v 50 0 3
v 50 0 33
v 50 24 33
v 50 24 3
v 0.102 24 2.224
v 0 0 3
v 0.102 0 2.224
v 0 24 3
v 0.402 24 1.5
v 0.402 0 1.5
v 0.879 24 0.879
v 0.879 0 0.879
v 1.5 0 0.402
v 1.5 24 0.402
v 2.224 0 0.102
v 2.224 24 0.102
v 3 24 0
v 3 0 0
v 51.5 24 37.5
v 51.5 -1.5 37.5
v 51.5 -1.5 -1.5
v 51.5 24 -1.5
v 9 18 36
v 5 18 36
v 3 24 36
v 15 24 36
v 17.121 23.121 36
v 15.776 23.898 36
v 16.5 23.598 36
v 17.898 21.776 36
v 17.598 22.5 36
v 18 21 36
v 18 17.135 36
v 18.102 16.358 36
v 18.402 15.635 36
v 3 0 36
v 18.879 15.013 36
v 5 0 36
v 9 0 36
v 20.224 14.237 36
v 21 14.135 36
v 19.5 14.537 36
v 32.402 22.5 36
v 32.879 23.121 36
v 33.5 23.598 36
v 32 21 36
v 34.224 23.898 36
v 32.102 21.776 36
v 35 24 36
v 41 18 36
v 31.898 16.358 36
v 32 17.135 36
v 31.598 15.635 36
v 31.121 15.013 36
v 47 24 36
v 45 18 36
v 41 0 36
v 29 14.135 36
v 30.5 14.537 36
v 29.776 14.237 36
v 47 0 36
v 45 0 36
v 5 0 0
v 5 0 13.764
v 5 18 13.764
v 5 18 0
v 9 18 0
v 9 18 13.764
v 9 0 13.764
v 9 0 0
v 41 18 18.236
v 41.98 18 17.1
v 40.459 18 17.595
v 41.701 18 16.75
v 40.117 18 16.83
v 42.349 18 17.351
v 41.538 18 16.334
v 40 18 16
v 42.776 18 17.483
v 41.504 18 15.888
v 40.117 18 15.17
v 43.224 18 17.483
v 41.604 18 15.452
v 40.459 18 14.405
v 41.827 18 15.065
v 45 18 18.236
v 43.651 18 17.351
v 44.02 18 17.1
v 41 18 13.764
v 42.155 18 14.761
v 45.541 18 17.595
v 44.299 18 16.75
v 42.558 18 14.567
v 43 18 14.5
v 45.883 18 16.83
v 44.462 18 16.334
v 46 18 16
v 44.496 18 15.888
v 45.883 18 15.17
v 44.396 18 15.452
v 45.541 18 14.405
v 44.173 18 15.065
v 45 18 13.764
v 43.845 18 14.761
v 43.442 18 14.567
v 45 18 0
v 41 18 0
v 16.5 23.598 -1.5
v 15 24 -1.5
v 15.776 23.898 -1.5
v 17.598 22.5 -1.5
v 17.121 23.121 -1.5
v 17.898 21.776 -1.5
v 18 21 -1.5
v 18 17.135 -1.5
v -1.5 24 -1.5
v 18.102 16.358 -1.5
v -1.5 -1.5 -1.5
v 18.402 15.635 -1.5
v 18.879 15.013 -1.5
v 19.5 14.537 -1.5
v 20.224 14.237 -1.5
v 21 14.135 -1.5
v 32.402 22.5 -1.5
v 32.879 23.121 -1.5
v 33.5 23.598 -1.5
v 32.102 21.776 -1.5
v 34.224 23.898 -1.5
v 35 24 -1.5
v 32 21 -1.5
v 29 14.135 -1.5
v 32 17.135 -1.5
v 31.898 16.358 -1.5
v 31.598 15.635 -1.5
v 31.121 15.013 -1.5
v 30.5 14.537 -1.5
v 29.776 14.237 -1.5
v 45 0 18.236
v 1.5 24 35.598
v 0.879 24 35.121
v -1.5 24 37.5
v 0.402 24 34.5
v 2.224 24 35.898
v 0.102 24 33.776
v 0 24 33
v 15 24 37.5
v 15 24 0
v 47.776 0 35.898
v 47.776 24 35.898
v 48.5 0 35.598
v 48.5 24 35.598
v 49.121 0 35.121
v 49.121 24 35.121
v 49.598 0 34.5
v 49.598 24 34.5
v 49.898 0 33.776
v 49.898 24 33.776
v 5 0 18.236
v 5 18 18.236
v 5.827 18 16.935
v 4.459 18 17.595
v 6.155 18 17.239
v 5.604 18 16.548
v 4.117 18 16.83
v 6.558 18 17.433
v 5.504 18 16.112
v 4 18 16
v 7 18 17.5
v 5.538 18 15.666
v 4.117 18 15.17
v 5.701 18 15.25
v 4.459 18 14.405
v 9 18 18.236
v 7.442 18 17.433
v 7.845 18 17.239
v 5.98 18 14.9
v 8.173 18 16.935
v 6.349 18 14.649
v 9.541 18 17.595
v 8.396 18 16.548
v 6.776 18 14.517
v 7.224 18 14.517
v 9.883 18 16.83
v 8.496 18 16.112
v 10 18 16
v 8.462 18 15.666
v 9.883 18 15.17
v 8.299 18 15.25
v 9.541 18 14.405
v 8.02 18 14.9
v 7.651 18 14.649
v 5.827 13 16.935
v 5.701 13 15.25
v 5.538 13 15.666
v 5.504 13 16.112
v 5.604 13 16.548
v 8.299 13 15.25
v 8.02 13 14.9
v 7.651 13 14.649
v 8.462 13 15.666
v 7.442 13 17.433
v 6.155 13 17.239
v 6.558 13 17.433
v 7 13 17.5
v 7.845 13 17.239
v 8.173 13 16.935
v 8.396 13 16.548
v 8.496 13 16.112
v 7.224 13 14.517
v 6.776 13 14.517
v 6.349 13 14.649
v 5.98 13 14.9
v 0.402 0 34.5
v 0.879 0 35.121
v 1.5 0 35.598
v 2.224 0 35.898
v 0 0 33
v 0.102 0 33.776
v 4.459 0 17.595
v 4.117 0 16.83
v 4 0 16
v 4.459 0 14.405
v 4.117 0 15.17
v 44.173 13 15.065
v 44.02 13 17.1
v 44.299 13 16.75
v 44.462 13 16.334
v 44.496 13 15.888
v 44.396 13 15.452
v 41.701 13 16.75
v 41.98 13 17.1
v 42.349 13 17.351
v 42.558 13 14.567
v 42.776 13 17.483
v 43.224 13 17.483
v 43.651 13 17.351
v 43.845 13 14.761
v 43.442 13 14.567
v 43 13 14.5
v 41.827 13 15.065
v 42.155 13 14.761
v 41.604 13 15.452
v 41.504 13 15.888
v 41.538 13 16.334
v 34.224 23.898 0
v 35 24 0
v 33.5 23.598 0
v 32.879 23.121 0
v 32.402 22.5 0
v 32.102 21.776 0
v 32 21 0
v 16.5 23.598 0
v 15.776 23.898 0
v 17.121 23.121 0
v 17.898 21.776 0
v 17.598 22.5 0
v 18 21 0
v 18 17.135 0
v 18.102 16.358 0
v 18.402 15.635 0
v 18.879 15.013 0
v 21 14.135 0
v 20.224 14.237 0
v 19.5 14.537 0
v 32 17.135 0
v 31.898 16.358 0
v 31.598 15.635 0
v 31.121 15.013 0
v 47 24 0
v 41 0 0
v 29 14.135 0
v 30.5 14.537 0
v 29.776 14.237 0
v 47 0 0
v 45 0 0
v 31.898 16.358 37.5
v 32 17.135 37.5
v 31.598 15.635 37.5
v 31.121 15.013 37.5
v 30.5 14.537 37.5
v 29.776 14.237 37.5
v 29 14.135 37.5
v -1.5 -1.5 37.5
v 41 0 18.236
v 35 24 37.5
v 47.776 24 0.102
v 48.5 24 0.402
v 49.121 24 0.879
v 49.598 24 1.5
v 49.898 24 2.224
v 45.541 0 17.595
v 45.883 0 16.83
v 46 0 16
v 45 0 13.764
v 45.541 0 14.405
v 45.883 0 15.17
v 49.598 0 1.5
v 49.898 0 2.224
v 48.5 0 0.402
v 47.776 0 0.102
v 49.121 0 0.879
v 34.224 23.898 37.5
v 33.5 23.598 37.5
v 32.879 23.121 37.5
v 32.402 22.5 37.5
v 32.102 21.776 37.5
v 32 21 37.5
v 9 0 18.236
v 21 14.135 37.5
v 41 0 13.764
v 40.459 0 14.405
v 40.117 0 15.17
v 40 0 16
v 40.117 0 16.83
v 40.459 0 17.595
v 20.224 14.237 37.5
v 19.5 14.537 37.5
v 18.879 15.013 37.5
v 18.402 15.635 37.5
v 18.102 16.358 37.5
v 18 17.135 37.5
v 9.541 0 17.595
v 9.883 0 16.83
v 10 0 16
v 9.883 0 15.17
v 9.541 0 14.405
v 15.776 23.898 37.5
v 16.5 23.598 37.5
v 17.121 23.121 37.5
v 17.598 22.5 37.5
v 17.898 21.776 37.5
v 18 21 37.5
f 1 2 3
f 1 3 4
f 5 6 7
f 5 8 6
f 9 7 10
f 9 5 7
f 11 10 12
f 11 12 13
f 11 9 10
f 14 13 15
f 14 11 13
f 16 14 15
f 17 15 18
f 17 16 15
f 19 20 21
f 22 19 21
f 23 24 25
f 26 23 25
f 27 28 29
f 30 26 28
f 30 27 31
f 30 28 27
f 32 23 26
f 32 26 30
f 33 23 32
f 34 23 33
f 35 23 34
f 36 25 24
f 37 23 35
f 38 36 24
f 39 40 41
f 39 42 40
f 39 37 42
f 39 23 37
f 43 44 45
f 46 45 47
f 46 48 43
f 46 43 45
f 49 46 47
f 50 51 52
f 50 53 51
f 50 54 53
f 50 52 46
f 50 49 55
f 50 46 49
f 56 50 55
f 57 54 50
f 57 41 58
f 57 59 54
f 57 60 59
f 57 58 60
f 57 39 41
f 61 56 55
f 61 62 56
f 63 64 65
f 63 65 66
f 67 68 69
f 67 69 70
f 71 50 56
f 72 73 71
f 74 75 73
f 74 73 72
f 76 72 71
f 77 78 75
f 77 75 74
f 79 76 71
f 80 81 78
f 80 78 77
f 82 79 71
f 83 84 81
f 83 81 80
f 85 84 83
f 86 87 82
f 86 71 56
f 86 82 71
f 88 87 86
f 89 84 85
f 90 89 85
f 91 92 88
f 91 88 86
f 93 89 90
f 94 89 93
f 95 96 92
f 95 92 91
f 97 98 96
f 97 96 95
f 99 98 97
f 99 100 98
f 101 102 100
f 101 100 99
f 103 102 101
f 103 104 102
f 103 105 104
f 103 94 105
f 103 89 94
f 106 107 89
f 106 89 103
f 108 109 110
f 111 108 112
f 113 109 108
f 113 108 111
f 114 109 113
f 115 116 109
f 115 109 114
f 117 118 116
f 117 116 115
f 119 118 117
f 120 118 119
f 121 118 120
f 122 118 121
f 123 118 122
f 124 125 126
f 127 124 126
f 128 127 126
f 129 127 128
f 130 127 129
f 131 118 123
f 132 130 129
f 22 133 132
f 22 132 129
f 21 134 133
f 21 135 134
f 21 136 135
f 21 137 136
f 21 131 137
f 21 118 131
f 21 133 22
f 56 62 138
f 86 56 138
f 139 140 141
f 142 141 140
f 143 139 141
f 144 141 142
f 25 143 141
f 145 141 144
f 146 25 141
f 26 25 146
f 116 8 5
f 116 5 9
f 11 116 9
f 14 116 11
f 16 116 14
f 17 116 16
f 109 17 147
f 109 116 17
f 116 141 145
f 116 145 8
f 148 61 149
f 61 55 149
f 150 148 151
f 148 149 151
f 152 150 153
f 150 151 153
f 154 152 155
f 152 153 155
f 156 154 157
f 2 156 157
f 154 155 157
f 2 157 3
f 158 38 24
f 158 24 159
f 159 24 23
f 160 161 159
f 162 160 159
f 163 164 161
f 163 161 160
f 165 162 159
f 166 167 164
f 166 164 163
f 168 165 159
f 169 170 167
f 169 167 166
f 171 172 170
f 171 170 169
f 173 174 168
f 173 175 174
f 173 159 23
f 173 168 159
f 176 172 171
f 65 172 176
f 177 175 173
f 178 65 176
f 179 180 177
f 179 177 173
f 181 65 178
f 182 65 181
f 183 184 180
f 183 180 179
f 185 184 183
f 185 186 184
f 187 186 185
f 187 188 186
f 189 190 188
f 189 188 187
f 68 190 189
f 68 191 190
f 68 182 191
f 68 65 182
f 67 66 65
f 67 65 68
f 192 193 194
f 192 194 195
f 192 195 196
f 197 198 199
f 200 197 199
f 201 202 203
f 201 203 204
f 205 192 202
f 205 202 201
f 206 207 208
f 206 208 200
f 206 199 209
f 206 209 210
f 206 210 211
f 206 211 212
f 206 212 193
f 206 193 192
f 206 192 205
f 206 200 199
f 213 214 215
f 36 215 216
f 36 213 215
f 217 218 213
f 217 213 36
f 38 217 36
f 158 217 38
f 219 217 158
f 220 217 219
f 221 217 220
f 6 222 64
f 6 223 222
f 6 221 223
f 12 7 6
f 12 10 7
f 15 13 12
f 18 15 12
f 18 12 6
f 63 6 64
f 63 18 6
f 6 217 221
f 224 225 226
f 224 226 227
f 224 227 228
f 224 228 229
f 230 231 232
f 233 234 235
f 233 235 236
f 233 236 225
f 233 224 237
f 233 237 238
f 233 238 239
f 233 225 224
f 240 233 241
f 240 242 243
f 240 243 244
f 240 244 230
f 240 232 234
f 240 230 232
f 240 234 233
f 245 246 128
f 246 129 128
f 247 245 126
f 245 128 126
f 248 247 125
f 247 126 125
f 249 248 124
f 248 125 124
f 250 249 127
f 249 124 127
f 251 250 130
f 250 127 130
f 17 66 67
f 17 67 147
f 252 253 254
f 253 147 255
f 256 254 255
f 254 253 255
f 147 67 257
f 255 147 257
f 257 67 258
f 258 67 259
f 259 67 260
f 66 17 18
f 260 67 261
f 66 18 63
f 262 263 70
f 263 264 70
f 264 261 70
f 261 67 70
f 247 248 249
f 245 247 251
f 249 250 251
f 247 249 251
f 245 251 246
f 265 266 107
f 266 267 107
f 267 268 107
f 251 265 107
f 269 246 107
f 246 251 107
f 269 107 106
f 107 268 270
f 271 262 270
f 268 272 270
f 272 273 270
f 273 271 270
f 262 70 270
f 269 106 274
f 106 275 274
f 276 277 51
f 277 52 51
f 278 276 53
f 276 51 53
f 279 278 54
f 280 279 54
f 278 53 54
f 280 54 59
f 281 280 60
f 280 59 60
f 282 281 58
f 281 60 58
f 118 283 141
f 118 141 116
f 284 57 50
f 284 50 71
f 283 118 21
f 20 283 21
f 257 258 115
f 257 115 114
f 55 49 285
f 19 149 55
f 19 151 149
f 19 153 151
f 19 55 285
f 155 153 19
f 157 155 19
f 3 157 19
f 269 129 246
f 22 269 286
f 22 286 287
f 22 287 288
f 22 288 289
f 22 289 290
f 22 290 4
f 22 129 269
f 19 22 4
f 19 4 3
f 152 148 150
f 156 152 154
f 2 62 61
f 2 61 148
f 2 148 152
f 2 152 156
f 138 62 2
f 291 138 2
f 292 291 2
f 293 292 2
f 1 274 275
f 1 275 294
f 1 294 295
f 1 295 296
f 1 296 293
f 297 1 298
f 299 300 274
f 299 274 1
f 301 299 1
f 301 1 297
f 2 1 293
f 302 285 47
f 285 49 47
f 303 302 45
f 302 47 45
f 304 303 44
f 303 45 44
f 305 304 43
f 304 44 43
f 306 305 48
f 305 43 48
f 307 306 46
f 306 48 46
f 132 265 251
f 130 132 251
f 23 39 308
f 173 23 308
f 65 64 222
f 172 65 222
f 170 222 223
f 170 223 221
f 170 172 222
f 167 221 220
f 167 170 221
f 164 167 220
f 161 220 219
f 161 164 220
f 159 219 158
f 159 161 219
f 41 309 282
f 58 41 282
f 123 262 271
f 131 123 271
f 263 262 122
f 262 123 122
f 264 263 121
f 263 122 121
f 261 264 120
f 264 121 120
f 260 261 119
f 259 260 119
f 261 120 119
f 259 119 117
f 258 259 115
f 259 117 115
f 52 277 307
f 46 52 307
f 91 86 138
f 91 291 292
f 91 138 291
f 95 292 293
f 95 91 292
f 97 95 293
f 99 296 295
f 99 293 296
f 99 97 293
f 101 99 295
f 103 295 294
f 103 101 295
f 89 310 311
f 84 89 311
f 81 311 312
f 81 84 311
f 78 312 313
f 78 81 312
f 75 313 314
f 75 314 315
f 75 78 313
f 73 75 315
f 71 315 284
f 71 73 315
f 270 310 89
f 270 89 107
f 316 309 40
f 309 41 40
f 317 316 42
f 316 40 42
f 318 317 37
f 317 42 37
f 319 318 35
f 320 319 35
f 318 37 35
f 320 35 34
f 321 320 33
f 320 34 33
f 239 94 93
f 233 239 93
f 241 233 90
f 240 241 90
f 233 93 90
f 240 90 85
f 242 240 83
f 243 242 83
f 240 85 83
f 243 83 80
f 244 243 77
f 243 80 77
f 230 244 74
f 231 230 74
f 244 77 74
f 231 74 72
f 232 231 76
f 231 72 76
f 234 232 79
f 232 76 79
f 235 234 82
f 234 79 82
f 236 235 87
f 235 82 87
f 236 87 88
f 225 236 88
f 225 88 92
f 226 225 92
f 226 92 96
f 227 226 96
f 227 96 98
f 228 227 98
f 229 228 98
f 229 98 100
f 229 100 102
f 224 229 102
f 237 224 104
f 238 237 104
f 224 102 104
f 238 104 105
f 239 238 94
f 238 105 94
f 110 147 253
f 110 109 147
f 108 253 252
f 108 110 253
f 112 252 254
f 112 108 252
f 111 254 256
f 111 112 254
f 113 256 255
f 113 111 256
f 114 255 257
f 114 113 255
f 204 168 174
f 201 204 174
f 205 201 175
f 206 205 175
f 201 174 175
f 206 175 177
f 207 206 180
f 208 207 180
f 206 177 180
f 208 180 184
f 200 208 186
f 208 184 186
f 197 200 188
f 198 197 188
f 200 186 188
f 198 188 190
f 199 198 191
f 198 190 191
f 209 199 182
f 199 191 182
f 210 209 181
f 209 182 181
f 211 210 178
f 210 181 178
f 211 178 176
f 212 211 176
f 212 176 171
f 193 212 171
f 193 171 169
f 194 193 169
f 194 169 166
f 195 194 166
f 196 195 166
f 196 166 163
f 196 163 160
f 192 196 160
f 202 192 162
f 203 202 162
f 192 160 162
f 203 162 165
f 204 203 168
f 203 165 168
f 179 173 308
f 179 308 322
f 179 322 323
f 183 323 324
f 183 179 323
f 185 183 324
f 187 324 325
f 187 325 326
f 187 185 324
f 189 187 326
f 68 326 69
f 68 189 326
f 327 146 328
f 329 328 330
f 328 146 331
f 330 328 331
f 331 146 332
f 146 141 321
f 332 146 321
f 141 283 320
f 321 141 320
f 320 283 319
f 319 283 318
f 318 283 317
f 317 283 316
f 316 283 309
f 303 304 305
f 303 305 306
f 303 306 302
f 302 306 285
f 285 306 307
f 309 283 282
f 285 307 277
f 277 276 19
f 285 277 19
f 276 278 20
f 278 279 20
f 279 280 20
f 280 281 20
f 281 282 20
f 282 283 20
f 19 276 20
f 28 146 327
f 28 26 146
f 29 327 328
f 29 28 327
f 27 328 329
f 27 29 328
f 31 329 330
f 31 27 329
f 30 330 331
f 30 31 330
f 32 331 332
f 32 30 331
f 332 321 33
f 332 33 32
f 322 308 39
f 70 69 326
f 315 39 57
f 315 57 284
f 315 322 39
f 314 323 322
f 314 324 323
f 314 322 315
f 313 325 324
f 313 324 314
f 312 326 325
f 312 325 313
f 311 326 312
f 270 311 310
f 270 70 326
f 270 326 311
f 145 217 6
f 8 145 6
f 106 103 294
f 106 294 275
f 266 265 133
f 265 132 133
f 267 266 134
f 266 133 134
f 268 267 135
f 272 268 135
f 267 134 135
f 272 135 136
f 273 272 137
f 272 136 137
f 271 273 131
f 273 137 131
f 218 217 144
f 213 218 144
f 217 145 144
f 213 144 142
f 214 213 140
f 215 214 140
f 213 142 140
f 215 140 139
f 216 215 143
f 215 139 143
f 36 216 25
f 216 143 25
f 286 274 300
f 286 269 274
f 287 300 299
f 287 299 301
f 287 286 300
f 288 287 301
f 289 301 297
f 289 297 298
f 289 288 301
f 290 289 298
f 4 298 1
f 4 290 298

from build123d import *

# Parameters (mm, degrees)
SKETCH1_W           = 50
SKETCH1_H           = 36
BOSS_EXTRUDE1_DEPTH = 24
SHELL1_T            = 1.5
SKETCH2_W           = 4
SKETCH2_H           = 36
BOSS_EXTRUDE2_DEPTH = 18
SKETCH6_W           = 14
SKETCH6_H           = 14
CUT_EXTRUDE2_DEPTH  = 58
FILLET1_R           = 3
SKETCH4_R           = 3
BOSS_EXTRUDE3_DEPTH = 18
SKETCH7_R           = 1.5
CUT_EXTRUDE3_DEPTH  = 5


with BuildPart() as part:
    # Sketch1 → Boss-Extrude1 (new body)
    with BuildSketch(Plane(origin=(0, 0, 0), x_dir=(1, 0, 0), z_dir=(0, 1, 0))):
        with Locations((25, -18)):
            Rectangle(SKETCH1_W, SKETCH1_H)
    extrude(amount=BOSS_EXTRUDE1_DEPTH)

    # Shell1
    shell1_openings = [part.faces().sort_by_distance(p)[0] for p in [
        (25, 24, 18),
    ]]
    offset(amount=SHELL1_T, openings=shell1_openings, kind=Kind.INTERSECTION)

    # Sketch2 → Boss-Extrude2 (add)
    with BuildSketch(Plane(origin=(0, 0, 0), x_dir=(1, 0, 0), z_dir=(0, 1, 0))):
        with Locations((7, -18)):
            Rectangle(SKETCH2_W, SKETCH2_H)
        with Locations((43, -18)):
            Rectangle(SKETCH2_W, SKETCH2_H)
    extrude(amount=BOSS_EXTRUDE2_DEPTH)

    # Sketch6 → Cut-Extrude2 (cut)
    with BuildSketch(Plane.XY.offset(37.5)):
        with Locations((25, 21.134691447)):
            Rectangle(SKETCH6_W, SKETCH6_H)
    extrude(amount=-CUT_EXTRUDE2_DEPTH, mode=Mode.SUBTRACT)

    # Fillet1
    fillet1_edges = [part.edges().sort_by_distance(p)[0] for p in [
        (0, 12, 0),
        (0, 12, 36),
        (50, 12, 36),
        (50, 12, 0),
        (32, 24, -0.75),
        (32, 24, 36.75),
        (18, 24, 36.75),
        (18, 24, -0.75),
        (32, 14.134691447, 36.75),
        (32, 14.134691447, -0.75),
        (18, 14.134691447, -0.75),
        (18, 14.134691447, 36.75),
    ]]
    fillet(fillet1_edges, radius=FILLET1_R)

    # Sketch4 → Boss-Extrude3 (add)
    with BuildSketch(Plane(origin=(0, 18, 0), x_dir=(1, 0, 0), z_dir=(0, 1, 0))):
        with Locations((7, -16)):
            Circle(SKETCH4_R)
        with Locations((43, -16)):
            Circle(SKETCH4_R)
    extrude(amount=-BOSS_EXTRUDE3_DEPTH)

    # Sketch7 → Cut-Extrude3 (cut)
    with BuildSketch(Plane(origin=(0, 18, 0), x_dir=(1, 0, 0), z_dir=(0, 1, 0))):
        with Locations(Location((7, -16, 0), (0, 0, 270))):
            Circle(SKETCH7_R)
        with Locations(Location((43, -16, 0), (0, 0, 90))):
            Circle(SKETCH7_R)
    extrude(amount=-CUT_EXTRUDE3_DEPTH, mode=Mode.SUBTRACT)


solid = part.part
